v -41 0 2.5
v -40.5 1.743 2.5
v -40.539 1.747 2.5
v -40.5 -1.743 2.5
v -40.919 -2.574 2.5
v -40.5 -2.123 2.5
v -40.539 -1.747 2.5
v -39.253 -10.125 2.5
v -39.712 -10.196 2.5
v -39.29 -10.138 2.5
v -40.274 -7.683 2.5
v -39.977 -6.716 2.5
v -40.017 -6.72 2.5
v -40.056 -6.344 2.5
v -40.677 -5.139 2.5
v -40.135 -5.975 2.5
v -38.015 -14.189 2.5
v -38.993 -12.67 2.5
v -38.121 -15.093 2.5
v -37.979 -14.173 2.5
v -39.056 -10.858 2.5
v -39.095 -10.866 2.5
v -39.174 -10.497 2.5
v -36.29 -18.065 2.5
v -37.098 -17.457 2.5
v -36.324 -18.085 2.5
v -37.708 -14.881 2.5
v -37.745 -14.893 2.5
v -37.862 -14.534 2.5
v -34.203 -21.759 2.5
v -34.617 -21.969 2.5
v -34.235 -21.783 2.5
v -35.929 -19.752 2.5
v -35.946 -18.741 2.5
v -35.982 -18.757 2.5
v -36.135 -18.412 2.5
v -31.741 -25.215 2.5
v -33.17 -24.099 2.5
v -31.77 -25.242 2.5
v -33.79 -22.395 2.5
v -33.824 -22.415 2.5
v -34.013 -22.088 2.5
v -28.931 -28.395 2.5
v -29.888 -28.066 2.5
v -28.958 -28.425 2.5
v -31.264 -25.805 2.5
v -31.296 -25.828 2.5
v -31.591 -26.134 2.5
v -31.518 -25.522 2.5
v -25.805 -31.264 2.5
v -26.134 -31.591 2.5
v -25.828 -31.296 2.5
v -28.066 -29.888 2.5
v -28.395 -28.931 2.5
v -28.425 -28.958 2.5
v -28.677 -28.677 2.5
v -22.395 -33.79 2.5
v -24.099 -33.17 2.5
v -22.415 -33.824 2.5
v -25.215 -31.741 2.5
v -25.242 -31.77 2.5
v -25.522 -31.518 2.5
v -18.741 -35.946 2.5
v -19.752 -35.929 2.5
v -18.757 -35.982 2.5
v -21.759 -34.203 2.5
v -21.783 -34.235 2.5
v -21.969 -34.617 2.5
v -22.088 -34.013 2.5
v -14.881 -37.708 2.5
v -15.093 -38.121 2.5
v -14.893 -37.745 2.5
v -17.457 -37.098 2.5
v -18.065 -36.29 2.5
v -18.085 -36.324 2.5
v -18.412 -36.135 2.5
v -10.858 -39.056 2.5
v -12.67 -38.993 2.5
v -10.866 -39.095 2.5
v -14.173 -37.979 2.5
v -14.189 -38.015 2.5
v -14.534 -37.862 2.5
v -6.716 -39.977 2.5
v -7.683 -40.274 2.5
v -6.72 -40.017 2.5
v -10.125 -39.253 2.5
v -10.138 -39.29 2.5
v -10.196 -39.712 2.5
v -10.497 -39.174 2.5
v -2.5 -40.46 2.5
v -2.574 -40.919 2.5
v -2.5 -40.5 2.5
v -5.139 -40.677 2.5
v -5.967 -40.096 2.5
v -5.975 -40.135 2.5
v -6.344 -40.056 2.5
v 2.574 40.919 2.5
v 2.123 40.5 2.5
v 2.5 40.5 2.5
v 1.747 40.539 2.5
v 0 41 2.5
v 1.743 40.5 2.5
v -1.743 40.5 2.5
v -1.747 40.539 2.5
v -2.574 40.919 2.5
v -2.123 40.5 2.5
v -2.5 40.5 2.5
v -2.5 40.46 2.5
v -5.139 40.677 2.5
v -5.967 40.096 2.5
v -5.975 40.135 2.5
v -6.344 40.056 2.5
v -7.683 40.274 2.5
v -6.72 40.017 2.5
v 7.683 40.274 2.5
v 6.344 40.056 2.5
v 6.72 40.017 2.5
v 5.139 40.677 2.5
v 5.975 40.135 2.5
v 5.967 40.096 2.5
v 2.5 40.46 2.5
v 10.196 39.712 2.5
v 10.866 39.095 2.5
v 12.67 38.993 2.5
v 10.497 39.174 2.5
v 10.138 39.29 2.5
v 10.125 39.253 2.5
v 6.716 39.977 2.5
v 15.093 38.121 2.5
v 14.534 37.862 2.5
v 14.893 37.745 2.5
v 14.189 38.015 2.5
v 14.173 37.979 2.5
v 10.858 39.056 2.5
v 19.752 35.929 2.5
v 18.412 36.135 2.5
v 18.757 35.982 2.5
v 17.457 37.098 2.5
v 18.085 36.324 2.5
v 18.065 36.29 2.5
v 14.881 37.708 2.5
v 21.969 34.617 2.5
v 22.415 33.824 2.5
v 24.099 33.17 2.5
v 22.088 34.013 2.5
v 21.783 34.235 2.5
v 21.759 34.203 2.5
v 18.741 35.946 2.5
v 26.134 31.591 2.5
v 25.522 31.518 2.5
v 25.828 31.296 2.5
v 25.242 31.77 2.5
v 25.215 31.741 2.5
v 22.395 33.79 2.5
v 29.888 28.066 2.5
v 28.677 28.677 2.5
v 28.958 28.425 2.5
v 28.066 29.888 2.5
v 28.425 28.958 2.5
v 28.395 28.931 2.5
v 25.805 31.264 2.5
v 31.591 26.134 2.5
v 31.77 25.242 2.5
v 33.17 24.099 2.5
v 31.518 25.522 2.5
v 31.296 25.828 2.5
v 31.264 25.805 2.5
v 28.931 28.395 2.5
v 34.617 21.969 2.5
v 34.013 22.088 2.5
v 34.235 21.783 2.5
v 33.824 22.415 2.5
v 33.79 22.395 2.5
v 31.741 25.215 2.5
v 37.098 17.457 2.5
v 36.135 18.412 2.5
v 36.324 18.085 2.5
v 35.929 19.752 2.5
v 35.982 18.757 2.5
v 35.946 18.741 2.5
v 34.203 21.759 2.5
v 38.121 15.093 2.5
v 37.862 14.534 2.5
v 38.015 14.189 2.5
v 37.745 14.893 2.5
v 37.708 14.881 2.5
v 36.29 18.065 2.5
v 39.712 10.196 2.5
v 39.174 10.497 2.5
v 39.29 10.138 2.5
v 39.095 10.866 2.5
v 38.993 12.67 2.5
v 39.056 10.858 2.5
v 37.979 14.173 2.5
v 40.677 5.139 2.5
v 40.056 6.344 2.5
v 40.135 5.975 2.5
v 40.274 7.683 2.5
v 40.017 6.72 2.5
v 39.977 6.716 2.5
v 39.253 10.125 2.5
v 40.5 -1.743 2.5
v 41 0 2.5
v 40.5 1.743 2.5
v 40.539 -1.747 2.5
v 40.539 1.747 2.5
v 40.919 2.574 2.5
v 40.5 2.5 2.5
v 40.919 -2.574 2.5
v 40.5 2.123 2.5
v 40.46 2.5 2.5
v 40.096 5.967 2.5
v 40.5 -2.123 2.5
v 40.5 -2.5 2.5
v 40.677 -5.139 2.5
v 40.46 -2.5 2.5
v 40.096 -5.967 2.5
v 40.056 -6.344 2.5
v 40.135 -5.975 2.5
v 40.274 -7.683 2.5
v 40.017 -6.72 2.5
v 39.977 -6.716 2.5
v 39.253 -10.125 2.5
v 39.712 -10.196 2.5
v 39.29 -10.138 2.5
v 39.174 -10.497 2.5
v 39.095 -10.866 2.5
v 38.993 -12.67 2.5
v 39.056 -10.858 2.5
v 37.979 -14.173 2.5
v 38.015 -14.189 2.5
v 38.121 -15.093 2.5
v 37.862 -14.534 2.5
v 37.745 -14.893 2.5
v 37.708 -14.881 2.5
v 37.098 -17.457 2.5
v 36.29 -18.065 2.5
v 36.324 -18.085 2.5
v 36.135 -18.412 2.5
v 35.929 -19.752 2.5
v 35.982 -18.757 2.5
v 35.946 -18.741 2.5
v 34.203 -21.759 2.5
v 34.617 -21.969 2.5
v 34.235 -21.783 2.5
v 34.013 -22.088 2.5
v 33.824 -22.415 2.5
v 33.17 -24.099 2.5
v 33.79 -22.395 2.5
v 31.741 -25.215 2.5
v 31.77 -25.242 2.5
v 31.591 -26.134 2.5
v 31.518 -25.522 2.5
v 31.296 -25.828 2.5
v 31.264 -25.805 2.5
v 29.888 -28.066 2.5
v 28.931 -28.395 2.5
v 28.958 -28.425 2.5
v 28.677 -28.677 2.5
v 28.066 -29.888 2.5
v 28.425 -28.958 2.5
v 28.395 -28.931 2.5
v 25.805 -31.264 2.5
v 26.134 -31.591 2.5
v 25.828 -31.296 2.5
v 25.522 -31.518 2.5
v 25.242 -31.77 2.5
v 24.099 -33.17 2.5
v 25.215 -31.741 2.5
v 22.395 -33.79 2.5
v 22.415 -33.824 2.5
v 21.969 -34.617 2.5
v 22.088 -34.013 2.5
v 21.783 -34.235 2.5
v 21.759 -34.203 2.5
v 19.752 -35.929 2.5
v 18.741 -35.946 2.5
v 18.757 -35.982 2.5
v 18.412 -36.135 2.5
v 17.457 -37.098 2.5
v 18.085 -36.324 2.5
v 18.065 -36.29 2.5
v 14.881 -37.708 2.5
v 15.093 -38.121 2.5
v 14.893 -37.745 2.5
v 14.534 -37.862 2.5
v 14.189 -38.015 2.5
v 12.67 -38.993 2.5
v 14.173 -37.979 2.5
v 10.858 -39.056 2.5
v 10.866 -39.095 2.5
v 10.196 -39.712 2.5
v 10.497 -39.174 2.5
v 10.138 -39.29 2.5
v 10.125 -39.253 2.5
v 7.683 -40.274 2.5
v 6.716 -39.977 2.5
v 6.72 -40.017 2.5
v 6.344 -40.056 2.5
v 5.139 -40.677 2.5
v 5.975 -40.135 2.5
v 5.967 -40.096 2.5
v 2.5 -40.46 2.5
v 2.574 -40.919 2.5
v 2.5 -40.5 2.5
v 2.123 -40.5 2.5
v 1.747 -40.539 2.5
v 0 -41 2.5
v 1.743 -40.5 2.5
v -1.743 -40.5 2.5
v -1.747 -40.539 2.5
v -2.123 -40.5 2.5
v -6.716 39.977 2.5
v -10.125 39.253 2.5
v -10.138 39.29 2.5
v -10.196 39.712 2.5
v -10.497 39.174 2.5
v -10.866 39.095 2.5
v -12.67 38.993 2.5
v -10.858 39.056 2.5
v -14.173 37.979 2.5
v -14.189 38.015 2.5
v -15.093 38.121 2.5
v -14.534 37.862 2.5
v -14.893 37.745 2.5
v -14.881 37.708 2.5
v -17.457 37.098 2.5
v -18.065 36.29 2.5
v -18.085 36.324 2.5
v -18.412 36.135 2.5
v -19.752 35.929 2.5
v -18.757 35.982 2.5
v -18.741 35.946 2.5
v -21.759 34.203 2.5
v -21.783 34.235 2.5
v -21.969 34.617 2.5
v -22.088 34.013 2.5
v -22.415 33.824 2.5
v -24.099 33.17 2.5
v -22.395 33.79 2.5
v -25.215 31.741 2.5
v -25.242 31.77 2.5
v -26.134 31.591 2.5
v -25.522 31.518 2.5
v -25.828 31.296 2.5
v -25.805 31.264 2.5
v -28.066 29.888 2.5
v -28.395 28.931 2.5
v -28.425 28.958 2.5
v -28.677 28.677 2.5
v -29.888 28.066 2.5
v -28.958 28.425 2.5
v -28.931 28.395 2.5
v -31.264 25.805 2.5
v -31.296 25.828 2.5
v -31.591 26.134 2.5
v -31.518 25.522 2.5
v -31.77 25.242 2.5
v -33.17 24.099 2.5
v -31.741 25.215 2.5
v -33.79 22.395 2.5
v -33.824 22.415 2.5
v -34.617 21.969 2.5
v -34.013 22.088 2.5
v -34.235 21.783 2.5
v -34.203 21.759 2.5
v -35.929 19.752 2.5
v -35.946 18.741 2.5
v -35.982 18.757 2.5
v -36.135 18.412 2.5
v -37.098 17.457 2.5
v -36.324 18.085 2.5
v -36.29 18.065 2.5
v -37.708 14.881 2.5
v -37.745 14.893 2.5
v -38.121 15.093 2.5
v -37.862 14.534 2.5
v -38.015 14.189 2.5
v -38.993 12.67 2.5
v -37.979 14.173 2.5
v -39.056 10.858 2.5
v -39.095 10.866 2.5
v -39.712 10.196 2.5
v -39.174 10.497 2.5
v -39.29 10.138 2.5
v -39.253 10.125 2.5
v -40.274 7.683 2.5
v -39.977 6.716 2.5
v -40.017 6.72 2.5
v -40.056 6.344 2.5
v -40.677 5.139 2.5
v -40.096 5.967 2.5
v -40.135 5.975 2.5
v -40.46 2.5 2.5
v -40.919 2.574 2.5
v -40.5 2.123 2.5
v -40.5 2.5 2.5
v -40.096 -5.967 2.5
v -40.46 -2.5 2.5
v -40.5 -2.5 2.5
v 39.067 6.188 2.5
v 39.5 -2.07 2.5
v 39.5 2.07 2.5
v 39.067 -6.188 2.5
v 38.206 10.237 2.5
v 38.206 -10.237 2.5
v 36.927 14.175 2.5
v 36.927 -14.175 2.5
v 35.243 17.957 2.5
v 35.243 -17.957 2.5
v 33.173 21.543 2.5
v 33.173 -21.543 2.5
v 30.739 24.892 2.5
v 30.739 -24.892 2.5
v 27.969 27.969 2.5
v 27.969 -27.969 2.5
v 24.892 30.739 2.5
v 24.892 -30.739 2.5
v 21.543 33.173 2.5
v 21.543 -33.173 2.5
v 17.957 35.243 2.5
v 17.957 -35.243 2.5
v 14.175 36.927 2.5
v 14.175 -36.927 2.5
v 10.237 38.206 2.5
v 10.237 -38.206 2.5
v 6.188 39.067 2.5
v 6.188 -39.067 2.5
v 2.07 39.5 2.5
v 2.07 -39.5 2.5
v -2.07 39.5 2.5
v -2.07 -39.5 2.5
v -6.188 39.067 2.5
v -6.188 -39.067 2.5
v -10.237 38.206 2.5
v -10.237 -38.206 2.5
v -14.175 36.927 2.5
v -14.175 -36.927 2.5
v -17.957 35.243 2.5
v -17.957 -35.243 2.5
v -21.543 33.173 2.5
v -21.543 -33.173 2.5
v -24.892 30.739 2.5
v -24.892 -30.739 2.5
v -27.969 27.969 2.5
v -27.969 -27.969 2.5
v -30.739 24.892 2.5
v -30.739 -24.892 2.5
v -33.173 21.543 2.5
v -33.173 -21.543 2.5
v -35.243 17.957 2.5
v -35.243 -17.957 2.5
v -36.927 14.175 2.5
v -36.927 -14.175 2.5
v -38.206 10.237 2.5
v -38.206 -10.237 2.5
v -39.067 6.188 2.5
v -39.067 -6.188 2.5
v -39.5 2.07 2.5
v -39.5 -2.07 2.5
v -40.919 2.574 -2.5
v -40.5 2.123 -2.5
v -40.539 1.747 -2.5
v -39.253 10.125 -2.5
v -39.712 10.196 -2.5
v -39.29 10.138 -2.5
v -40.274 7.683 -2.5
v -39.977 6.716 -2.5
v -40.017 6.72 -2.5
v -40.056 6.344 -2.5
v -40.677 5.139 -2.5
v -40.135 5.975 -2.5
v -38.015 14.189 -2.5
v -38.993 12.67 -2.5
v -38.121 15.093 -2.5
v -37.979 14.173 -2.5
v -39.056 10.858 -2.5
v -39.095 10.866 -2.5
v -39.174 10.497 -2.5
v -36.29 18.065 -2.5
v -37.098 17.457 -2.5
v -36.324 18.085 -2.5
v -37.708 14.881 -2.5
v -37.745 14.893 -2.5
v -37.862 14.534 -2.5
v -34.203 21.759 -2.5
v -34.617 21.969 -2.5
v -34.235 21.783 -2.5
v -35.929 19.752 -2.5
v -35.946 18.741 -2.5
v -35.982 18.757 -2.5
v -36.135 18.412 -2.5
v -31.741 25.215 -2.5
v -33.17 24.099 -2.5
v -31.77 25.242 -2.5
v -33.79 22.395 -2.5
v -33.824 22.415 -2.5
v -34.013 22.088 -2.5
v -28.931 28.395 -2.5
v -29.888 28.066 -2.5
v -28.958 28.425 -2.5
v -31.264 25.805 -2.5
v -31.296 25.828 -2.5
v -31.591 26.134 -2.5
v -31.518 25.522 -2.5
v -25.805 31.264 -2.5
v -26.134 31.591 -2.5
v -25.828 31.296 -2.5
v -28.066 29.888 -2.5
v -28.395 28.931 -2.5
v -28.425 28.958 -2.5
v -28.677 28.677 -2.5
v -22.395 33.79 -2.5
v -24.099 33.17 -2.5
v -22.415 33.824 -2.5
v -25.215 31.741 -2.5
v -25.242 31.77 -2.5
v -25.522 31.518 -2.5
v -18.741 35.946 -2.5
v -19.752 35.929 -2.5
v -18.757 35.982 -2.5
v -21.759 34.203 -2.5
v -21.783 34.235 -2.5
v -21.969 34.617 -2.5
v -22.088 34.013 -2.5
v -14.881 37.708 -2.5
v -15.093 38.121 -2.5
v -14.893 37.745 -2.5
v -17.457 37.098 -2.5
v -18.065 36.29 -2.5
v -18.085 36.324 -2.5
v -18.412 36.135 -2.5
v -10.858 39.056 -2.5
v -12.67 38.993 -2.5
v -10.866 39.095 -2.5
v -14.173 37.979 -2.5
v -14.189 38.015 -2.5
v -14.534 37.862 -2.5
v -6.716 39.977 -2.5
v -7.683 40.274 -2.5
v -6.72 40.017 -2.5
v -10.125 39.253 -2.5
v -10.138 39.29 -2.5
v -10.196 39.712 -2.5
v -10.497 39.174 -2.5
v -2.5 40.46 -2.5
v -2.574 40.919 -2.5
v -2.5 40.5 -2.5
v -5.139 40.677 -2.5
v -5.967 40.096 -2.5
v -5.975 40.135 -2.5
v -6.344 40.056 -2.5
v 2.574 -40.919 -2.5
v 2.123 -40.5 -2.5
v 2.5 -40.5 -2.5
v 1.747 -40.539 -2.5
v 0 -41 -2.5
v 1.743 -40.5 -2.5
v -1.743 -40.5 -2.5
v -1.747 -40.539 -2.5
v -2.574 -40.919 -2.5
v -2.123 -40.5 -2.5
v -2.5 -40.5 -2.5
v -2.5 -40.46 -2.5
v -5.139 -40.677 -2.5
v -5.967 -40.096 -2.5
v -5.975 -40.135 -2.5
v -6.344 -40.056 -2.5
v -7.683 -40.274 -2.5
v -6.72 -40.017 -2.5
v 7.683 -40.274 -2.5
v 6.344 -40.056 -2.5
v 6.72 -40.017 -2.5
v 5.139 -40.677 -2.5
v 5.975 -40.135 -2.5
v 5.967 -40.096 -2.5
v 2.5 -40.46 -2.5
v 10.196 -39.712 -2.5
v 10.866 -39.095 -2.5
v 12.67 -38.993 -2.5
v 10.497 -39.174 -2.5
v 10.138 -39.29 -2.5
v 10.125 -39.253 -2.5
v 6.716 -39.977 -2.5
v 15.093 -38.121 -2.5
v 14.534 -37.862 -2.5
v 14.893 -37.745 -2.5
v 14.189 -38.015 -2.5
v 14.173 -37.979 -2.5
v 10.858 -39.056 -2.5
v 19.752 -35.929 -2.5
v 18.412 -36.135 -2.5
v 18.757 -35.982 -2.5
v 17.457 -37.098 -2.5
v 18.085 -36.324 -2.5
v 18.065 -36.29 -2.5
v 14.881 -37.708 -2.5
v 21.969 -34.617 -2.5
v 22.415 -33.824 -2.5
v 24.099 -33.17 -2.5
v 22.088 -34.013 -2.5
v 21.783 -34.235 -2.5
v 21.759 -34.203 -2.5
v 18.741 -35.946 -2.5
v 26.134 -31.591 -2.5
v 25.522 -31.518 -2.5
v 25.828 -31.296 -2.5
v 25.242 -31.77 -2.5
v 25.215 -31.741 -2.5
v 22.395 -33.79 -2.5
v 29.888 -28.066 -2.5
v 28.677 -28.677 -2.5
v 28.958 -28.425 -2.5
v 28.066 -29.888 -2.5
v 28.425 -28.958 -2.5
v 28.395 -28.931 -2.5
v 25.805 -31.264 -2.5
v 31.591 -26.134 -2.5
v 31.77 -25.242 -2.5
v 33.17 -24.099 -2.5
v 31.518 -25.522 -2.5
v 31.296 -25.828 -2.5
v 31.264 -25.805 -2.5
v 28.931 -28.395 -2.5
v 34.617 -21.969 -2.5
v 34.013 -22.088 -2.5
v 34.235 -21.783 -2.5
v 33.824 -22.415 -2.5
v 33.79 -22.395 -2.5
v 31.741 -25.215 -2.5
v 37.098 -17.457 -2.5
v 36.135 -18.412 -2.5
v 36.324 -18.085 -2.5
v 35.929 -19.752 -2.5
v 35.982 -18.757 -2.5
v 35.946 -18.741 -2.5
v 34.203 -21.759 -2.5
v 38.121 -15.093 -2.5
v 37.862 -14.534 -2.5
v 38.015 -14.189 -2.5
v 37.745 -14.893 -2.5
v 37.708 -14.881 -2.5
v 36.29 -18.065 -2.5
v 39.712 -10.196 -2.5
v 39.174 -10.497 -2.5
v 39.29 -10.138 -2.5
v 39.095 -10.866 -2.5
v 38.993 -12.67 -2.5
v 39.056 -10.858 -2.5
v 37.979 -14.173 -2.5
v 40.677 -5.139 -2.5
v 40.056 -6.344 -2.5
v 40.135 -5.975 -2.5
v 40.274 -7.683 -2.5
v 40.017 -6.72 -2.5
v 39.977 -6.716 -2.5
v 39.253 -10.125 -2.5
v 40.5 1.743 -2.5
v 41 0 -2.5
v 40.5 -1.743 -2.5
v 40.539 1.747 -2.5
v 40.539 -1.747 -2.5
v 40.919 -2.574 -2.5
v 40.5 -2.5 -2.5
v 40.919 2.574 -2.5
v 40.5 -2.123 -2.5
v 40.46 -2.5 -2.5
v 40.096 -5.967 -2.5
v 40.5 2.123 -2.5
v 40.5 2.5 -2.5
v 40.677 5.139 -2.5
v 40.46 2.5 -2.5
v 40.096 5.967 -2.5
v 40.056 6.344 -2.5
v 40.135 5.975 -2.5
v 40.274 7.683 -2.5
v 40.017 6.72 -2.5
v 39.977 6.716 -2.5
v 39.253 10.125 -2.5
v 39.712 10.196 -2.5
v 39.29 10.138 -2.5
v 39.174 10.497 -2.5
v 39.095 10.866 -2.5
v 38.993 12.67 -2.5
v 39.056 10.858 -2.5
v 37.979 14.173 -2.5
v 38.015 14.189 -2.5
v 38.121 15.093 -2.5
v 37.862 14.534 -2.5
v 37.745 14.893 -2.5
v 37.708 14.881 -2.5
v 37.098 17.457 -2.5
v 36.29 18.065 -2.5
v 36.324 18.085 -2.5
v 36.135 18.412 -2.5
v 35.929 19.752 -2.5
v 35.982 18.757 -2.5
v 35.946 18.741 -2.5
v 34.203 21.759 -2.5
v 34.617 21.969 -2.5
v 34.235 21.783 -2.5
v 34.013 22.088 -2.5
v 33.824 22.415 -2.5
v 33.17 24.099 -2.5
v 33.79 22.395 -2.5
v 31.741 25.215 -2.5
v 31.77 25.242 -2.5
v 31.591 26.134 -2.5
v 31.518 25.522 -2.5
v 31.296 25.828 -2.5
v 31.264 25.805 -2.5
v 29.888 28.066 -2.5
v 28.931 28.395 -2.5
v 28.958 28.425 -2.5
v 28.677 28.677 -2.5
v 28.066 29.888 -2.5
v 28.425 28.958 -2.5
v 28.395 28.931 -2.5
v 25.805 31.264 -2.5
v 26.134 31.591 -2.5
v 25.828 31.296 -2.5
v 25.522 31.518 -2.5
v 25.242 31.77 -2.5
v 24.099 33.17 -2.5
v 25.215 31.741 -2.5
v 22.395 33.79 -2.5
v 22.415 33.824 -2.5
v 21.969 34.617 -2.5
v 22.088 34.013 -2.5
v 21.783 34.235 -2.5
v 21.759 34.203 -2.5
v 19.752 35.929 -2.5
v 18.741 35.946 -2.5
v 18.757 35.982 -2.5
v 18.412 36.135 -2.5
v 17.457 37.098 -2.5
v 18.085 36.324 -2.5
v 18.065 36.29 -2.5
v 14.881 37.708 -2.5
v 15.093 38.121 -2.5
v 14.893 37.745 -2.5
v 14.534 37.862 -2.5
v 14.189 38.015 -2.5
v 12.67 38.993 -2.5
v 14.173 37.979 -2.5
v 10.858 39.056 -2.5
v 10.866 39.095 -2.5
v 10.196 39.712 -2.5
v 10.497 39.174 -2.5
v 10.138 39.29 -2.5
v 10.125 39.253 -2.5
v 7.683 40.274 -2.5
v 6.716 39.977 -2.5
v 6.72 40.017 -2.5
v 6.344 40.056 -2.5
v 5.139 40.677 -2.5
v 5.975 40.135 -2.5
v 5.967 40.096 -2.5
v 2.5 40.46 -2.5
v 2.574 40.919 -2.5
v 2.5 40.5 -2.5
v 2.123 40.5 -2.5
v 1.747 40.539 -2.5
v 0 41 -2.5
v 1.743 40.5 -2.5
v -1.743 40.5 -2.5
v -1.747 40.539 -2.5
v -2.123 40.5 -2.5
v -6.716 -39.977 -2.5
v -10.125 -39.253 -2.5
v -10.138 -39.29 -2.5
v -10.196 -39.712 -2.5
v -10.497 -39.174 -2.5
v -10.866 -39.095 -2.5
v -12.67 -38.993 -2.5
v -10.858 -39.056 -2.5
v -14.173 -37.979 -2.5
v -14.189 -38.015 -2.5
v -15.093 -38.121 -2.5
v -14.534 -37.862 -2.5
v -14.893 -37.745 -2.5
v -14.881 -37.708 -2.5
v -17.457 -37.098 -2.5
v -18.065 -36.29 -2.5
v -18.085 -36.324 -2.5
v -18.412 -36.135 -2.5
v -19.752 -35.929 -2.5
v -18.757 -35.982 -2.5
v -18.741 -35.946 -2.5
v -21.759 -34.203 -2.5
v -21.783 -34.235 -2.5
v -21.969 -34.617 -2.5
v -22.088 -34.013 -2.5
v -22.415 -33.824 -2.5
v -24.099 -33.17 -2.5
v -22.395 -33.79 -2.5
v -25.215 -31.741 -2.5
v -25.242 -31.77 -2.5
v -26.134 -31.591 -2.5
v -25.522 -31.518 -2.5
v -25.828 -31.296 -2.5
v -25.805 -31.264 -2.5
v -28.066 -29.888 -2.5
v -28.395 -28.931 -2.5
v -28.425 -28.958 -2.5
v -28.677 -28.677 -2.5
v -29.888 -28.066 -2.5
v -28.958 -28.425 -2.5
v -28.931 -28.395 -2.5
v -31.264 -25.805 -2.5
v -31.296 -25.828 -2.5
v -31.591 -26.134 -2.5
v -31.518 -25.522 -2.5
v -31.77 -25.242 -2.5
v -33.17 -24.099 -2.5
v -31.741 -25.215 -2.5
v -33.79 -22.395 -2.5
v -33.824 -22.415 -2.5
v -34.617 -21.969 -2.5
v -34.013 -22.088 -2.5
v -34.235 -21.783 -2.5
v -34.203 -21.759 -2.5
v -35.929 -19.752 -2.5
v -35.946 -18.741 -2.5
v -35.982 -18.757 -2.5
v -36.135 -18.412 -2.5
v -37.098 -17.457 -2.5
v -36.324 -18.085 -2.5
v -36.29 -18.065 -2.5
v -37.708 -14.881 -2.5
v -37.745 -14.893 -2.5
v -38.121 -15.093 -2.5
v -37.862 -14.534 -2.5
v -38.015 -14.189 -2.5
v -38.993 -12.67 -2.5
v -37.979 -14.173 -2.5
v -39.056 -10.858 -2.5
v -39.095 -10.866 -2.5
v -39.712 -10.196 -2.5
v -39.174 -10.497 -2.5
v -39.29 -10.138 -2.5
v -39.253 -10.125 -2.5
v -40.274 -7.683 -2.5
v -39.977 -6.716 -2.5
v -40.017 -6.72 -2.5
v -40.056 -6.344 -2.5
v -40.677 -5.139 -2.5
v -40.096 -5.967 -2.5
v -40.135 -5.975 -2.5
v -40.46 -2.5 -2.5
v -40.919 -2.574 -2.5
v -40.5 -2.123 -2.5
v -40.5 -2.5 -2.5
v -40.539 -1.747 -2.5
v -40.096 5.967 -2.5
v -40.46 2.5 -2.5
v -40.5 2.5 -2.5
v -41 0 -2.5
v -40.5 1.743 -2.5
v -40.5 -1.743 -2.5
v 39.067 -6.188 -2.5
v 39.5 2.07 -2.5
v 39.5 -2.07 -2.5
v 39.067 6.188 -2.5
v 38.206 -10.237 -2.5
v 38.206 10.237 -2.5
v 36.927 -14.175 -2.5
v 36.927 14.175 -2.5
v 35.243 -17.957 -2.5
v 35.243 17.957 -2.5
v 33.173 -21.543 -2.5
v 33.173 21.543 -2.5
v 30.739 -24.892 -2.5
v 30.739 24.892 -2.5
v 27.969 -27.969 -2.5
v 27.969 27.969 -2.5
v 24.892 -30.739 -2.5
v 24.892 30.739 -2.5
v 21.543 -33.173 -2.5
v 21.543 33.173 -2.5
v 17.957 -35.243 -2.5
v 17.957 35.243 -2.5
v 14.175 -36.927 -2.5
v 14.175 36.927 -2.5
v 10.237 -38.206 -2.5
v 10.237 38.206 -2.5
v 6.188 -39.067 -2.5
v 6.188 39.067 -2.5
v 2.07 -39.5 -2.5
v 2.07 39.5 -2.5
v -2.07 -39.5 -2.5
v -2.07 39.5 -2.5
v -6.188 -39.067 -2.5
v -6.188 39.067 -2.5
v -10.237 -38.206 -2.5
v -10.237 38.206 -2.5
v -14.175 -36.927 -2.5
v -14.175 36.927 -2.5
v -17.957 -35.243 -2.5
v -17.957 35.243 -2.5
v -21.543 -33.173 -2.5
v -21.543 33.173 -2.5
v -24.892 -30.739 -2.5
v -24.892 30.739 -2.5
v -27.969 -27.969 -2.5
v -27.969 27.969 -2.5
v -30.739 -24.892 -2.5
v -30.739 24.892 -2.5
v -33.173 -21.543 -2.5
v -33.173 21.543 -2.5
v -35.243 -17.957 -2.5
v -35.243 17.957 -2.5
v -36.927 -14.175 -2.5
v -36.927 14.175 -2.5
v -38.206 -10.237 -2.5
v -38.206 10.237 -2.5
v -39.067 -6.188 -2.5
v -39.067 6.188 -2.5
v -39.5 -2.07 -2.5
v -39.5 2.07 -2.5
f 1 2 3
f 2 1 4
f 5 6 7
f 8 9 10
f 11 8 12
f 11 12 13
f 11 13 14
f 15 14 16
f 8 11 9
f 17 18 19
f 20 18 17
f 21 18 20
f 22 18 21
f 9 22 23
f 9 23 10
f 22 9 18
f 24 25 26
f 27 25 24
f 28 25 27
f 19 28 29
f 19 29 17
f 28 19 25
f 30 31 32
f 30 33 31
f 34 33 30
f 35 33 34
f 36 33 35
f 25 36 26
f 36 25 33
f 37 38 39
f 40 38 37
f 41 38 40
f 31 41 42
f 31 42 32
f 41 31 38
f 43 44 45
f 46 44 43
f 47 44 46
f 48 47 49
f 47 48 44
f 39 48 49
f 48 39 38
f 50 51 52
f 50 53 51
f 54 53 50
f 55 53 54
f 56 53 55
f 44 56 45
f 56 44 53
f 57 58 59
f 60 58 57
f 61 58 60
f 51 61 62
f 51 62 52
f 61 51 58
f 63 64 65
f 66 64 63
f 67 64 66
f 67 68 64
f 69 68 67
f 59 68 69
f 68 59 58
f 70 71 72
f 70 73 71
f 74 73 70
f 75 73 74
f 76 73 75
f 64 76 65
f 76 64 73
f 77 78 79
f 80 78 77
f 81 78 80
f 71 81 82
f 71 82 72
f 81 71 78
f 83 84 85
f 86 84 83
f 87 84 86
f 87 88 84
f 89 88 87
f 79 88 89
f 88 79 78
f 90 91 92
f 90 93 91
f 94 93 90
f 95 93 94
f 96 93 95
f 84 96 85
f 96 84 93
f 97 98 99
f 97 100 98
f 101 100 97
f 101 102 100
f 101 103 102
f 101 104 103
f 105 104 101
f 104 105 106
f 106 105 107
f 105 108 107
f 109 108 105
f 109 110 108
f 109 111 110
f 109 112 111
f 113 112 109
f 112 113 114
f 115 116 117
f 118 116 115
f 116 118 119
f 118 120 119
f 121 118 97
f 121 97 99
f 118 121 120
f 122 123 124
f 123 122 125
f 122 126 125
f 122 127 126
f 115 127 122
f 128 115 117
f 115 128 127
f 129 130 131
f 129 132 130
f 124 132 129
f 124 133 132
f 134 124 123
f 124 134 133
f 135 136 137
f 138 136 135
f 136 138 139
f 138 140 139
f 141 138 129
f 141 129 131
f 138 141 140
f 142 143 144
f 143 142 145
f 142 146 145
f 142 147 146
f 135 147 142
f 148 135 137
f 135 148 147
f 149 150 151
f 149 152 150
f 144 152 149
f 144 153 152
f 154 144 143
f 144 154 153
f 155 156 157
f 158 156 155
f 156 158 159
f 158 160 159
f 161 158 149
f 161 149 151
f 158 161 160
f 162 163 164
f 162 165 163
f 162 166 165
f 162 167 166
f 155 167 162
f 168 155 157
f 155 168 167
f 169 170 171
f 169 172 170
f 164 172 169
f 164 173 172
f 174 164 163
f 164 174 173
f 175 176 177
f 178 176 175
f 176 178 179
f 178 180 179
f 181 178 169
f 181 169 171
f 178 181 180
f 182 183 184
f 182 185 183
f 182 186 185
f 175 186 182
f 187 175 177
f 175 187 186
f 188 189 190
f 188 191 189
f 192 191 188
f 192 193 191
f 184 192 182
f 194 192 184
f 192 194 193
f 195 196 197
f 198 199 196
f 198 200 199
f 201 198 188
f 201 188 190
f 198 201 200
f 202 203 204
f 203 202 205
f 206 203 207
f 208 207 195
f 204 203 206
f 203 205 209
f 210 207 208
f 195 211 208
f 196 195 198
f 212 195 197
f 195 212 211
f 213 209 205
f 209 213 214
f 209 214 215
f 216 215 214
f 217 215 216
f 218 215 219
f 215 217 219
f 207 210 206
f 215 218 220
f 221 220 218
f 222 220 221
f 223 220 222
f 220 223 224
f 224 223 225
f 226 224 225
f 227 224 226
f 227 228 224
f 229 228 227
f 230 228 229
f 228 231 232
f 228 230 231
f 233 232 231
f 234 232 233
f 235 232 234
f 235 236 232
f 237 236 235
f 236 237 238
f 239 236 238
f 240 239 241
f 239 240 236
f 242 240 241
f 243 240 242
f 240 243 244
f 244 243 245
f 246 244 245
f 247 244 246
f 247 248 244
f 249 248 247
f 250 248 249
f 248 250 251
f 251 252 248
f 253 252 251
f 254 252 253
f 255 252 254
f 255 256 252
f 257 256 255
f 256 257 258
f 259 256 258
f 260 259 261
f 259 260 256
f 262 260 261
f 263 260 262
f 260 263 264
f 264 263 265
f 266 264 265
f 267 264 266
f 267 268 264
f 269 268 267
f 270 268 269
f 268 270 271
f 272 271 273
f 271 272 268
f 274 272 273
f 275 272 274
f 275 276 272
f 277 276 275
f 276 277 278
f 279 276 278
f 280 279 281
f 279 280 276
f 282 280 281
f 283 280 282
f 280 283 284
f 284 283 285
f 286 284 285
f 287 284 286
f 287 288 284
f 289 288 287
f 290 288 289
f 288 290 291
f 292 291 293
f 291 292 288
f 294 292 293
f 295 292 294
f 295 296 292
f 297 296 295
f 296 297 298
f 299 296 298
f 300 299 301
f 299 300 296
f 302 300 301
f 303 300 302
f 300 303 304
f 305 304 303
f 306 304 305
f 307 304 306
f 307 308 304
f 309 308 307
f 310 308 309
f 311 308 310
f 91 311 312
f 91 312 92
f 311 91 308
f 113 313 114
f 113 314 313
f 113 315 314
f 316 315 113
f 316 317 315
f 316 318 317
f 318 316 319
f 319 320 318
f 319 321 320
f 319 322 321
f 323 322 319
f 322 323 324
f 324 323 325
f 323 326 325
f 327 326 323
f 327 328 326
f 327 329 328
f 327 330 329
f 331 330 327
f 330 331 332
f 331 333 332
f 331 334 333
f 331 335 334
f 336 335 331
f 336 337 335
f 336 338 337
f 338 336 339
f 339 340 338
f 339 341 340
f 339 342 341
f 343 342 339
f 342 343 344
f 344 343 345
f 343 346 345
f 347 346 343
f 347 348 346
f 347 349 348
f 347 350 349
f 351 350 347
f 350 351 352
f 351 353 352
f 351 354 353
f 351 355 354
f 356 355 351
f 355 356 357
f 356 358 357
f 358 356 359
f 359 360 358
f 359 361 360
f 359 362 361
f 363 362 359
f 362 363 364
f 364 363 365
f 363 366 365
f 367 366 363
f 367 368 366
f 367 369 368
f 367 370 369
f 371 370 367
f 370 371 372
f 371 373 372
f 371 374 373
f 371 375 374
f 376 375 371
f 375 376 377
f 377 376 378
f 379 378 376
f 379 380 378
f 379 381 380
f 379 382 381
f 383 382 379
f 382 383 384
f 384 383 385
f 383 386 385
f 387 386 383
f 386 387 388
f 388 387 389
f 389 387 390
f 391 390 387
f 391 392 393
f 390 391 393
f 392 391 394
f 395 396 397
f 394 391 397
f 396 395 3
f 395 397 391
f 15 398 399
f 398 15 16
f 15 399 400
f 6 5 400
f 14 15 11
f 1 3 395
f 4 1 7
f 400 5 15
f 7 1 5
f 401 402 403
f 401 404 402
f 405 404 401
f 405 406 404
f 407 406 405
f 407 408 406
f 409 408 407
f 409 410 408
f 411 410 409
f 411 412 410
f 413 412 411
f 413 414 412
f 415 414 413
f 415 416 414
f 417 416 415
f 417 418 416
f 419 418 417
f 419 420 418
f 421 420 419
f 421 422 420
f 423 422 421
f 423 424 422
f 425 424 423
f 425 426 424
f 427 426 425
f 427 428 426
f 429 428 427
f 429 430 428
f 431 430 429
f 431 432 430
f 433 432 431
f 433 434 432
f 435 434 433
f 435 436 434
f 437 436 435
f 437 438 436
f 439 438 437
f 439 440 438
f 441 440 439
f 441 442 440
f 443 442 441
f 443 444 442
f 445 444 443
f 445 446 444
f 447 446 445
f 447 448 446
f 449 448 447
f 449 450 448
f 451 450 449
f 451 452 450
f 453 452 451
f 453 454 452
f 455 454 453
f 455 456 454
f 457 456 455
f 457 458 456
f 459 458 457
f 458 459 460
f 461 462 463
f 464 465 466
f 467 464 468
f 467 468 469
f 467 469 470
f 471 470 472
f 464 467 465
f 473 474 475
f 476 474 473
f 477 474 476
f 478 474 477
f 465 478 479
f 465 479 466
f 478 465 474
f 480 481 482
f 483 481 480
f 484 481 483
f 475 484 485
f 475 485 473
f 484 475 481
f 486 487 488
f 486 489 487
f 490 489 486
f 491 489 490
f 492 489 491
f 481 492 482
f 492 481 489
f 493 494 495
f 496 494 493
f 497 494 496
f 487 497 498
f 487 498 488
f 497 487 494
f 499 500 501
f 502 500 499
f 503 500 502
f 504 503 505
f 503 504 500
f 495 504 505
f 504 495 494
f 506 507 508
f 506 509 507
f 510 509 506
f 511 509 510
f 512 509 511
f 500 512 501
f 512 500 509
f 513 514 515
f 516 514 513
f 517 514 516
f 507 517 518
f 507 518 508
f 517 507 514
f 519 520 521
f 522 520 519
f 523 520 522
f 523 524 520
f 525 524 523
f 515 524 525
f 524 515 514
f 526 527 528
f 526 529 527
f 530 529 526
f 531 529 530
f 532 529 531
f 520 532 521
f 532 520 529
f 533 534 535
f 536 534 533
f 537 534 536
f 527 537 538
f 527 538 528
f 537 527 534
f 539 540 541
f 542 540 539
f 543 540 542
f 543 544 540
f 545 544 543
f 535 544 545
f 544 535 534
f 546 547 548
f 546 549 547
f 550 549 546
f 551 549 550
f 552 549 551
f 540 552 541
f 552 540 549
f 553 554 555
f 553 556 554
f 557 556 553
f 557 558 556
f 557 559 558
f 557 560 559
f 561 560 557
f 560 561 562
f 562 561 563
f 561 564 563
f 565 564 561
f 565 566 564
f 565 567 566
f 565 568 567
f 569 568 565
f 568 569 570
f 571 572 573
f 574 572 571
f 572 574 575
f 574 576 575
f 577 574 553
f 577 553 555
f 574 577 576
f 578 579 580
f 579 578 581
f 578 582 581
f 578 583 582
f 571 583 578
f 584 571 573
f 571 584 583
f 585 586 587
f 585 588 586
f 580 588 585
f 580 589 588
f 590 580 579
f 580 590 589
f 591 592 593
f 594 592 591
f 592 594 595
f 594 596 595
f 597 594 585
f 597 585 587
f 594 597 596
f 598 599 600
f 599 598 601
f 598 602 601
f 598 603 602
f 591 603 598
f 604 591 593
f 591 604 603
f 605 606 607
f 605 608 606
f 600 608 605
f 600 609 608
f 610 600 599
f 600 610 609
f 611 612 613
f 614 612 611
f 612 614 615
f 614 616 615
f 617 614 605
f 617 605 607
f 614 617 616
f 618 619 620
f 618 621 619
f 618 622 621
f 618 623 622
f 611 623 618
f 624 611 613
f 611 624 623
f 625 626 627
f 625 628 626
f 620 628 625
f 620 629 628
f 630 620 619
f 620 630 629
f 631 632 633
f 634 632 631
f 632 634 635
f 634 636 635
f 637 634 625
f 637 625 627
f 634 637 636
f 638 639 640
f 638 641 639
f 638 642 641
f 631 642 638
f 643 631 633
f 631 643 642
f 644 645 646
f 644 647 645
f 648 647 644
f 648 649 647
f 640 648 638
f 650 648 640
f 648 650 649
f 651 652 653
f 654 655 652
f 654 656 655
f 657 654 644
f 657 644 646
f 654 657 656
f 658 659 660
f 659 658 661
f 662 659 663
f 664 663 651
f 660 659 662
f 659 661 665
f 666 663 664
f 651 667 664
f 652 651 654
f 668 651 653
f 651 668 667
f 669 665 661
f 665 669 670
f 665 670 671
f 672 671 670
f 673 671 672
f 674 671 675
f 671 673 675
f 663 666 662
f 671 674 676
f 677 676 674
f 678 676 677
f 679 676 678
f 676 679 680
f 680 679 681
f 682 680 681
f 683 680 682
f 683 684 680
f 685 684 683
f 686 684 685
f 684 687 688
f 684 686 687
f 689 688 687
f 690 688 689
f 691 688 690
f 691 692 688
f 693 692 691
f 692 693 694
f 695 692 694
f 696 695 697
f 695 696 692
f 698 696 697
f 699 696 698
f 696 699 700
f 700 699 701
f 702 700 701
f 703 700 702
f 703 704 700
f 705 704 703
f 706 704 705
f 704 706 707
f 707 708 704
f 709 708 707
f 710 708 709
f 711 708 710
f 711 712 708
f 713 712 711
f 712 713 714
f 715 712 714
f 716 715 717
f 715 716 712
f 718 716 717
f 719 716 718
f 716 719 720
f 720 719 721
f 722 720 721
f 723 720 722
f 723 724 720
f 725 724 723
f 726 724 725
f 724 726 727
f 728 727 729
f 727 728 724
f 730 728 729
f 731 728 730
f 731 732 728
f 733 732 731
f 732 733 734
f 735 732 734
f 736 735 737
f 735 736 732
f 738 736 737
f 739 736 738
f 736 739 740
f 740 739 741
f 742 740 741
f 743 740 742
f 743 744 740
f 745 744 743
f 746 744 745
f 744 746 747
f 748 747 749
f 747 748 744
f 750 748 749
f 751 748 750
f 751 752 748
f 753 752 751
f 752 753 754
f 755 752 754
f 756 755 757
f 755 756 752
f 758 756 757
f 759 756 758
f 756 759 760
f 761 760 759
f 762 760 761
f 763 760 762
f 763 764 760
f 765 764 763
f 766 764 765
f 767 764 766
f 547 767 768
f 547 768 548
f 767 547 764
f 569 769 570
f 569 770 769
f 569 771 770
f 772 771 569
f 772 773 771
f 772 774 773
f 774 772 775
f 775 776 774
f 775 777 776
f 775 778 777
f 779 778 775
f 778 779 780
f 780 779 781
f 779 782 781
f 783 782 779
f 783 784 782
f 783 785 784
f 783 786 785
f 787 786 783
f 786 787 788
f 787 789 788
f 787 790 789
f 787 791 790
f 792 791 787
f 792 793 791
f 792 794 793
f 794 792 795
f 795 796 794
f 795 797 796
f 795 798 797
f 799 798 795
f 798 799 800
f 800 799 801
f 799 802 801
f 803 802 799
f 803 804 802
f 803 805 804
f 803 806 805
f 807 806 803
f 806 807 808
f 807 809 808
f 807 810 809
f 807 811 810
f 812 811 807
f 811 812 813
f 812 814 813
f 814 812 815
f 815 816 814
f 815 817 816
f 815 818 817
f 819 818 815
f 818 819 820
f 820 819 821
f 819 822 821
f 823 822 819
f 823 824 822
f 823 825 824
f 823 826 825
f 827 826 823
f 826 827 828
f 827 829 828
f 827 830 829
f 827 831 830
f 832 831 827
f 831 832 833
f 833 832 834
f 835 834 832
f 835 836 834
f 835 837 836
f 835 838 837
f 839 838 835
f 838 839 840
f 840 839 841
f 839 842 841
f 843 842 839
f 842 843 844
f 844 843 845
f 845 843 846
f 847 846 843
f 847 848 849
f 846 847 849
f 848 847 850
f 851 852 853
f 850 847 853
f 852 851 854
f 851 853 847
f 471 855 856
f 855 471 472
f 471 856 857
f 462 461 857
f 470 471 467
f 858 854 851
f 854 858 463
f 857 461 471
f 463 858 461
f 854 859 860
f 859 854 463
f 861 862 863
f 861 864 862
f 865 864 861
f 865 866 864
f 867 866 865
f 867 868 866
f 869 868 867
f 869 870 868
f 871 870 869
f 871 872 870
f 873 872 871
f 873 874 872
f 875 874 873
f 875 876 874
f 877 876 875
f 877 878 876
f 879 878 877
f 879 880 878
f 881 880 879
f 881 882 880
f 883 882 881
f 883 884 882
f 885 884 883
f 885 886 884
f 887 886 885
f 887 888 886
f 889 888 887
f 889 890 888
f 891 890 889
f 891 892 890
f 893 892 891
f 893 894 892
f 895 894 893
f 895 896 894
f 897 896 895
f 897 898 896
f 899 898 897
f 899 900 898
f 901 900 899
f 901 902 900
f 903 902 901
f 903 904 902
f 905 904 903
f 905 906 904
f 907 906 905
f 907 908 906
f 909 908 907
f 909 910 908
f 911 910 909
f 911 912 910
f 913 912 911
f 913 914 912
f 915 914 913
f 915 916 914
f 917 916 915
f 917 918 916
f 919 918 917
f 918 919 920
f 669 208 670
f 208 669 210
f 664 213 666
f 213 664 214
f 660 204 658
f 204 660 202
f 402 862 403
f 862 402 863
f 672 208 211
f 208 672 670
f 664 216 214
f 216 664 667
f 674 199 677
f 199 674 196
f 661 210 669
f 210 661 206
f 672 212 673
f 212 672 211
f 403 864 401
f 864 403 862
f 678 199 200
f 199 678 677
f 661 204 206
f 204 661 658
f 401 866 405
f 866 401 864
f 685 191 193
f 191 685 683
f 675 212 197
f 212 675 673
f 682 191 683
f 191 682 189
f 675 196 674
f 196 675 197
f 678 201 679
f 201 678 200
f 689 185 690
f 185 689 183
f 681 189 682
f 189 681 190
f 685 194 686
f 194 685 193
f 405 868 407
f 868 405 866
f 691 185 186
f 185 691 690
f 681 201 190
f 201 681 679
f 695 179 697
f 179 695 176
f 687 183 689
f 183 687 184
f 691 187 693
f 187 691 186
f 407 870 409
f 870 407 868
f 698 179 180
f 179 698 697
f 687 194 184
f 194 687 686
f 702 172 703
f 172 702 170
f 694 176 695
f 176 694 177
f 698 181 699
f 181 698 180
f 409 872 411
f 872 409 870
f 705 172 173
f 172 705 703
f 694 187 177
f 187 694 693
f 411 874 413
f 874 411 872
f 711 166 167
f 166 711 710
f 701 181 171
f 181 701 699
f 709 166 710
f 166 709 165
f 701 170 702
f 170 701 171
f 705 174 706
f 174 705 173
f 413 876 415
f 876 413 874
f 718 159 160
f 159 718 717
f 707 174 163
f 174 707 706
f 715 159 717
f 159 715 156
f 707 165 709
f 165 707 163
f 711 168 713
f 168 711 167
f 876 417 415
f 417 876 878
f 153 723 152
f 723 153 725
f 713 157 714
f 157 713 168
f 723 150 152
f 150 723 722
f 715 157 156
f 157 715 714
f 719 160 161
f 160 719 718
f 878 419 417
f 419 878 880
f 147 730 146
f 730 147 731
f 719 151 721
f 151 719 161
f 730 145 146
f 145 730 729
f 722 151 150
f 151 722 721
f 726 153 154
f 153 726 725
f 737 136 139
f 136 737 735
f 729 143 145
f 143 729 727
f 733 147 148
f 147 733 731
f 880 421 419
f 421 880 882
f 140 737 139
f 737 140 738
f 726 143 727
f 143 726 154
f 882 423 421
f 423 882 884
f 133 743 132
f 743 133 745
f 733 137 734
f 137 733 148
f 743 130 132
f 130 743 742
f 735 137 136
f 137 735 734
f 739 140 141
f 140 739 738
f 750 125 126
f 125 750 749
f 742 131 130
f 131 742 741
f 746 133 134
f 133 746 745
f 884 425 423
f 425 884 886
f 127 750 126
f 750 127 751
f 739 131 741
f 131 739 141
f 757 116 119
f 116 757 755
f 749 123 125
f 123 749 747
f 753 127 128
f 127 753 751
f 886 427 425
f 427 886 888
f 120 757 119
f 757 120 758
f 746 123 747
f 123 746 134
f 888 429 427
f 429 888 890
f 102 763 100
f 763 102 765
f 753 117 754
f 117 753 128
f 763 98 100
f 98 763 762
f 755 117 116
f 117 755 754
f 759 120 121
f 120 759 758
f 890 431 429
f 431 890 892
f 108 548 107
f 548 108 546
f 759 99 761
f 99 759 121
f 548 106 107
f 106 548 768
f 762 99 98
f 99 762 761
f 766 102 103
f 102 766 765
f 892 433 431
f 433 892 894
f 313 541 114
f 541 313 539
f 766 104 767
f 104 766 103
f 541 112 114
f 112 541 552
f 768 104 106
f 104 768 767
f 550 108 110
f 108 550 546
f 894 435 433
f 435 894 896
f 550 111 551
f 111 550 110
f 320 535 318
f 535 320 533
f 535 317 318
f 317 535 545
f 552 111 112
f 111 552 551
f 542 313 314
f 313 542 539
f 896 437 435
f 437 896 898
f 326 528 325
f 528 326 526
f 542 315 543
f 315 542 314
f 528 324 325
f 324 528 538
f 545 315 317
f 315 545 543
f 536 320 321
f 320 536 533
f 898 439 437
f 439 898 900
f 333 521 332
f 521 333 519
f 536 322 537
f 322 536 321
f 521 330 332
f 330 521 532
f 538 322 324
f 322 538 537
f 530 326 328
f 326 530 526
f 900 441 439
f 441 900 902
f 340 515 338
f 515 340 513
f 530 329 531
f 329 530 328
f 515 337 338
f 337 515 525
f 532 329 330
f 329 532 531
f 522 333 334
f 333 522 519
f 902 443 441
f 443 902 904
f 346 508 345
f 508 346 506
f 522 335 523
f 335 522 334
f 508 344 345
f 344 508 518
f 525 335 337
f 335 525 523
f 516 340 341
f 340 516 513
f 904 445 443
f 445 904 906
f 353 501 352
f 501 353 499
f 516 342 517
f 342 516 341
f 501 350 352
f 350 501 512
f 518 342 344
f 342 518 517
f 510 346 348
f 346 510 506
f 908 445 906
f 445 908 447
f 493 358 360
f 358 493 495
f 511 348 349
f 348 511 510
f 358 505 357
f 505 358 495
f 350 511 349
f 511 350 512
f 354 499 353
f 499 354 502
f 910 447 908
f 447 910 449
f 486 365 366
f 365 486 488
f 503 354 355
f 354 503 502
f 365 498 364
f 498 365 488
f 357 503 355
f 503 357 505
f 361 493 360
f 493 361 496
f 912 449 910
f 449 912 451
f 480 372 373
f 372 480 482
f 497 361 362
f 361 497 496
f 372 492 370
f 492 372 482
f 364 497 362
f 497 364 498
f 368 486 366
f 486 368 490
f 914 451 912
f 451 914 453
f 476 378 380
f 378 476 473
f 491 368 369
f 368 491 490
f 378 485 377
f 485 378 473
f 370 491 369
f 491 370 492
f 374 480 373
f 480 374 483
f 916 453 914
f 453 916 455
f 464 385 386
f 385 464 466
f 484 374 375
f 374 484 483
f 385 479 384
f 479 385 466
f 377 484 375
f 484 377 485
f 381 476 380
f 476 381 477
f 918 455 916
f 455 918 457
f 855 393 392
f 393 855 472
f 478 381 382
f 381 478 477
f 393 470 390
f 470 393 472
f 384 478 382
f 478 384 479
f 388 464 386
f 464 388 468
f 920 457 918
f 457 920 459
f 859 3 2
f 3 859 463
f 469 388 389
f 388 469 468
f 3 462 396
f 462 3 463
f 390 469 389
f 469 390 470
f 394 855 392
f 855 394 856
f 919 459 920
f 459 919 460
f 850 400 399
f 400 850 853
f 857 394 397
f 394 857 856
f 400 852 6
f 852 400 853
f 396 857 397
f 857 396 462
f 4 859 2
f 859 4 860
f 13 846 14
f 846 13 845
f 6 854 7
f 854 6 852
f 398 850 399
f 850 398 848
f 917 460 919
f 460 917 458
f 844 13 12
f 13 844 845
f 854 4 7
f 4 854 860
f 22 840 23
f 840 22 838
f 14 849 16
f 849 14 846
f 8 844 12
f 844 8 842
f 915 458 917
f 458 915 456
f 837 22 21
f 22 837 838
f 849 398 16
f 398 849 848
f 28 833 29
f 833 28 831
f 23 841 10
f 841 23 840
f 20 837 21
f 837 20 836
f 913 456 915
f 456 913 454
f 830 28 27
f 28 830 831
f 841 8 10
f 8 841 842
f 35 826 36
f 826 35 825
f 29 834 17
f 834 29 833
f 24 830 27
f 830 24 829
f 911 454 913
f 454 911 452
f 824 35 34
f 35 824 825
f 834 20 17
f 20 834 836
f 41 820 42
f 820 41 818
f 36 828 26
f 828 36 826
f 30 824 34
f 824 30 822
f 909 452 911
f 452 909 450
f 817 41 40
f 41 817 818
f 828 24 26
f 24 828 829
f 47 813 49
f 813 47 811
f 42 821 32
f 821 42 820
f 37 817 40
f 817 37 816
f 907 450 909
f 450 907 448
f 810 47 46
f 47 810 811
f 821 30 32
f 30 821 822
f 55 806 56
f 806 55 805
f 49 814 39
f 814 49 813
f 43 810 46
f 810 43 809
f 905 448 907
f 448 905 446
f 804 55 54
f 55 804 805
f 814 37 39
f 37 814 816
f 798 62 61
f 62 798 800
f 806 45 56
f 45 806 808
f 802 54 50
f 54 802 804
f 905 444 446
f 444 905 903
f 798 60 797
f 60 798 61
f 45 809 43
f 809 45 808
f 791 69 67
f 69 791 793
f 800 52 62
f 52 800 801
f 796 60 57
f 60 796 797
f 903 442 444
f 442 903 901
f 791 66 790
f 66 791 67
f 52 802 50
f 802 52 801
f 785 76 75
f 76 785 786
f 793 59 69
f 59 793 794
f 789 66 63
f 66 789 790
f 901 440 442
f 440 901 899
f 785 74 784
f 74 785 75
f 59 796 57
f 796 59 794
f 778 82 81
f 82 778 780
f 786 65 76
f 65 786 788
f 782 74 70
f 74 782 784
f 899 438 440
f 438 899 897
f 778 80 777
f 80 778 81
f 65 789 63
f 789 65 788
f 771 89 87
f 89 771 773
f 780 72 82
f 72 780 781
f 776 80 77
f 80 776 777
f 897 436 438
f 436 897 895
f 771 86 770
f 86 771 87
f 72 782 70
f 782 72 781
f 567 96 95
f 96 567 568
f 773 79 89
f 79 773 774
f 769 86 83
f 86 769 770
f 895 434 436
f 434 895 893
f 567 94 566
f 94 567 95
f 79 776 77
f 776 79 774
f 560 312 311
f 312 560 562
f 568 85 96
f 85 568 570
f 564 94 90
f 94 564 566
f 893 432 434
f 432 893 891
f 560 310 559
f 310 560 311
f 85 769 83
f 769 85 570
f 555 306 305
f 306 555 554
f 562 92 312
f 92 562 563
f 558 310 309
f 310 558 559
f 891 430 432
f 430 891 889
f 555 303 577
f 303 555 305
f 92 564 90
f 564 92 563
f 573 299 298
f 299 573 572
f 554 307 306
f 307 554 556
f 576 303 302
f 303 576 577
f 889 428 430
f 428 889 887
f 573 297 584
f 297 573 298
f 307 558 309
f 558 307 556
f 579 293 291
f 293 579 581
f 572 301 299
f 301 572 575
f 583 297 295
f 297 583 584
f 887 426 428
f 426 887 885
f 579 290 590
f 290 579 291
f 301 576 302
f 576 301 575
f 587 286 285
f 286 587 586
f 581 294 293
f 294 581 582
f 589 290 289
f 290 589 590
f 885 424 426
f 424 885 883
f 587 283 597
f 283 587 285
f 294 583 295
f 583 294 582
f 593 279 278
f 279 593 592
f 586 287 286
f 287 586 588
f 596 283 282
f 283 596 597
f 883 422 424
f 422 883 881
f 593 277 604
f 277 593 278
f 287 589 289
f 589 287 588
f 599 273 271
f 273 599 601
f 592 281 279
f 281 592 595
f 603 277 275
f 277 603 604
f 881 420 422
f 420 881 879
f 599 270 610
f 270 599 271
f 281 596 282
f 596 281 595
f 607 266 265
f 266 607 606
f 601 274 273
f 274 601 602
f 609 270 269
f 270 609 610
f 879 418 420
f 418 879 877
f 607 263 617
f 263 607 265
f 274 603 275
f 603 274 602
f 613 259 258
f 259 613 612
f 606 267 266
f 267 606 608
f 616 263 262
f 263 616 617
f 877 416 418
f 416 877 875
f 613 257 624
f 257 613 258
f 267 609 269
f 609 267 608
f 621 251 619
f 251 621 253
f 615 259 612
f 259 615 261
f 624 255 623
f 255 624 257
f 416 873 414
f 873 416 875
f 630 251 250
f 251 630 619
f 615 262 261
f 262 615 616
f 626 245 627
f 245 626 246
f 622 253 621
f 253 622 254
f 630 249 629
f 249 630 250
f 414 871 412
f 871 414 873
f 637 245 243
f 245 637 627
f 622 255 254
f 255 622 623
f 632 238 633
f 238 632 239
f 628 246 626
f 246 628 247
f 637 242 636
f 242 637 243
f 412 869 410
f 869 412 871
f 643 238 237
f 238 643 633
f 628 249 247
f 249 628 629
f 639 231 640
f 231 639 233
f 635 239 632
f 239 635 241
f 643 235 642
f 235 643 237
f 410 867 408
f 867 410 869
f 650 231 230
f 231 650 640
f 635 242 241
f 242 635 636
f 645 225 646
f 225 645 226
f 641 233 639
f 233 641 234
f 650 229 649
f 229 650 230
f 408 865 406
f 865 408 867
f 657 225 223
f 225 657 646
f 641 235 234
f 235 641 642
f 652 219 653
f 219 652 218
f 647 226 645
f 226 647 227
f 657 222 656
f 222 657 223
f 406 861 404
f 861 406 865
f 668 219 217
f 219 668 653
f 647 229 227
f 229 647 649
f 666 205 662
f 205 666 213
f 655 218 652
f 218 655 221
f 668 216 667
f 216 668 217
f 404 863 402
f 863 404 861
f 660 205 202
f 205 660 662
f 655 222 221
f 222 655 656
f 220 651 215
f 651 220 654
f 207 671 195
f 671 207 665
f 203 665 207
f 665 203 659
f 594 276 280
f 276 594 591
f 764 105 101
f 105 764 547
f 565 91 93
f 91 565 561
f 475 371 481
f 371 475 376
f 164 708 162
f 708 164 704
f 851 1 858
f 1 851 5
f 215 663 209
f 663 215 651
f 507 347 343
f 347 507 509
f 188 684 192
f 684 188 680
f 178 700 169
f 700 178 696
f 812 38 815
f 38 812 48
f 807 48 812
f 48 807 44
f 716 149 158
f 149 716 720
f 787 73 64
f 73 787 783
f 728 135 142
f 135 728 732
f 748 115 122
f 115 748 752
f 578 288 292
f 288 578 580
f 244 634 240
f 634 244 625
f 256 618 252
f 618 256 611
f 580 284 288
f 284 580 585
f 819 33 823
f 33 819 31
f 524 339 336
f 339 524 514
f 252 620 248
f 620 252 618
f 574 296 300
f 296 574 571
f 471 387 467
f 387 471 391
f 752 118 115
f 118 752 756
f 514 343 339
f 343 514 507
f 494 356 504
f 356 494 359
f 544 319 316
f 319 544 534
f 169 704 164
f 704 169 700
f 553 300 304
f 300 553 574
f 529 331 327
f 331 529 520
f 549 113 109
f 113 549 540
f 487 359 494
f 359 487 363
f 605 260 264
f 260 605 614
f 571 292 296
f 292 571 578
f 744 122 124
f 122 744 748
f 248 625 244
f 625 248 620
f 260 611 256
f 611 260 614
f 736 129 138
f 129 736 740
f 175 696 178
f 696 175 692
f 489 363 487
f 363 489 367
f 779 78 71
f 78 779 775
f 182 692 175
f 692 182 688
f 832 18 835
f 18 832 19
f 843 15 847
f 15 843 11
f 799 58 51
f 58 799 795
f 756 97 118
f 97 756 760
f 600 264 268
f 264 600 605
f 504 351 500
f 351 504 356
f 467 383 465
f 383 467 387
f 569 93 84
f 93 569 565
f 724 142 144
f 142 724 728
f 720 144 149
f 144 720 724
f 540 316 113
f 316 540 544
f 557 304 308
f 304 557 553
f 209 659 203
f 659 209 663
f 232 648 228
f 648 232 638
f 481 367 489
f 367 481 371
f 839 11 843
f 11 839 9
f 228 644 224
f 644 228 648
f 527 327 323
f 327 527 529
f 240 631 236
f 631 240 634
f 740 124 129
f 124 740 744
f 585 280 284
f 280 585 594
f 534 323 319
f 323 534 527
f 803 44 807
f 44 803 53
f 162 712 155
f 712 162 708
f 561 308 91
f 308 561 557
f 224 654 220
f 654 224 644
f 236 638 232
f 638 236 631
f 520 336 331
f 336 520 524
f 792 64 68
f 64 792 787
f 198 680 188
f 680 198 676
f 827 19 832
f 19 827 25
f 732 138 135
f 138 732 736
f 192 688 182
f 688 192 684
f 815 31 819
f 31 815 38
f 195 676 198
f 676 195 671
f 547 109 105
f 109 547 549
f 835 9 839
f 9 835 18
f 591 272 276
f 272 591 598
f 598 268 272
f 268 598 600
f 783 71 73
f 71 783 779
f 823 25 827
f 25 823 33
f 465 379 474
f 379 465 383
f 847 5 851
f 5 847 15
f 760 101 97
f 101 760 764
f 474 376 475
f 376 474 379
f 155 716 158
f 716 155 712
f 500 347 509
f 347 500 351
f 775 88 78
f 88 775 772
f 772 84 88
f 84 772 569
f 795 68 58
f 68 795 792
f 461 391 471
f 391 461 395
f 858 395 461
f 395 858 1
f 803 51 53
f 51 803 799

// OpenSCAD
// Auto-generated Code Vault for 'PlanetaryGear' [Openscad]

module PlanetaryGear(
  sunTeeth = 10,
  planetTeeth = 20,
  ringTeeth = 60,
  pitchRadius = 20,
  thickness = 5,
  $fn = 100
) {
  // Calculate the pitch diameter
  sunPitchDiameter = pitchRadius * 2 * sunTeeth / (sunTeeth + planetTeeth);
  planetPitchDiameter = pitchRadius * 2 * planetTeeth / (sunTeeth + planetTeeth);
  ringPitchDiameter = pitchRadius * 2 * ringTeeth / (sunTeeth + planetTeeth);

  // Calculate the outer diameter
  sunOuterDiameter = sunPitchDiameter + 2;
  planetOuterDiameter = planetPitchDiameter + 2;
  ringOuterDiameter = ringPitchDiameter + 2;

  // Central sun gear
  module sunGear() {
    cylinder(h = thickness, d = sunOuterDiameter, center = true, $fn = $fn);
    for (i = [0 : sunTeeth - 1]) {
      rotate([0, 0, i * 360 / sunTeeth])
      translate([sunPitchDiameter / 2, 0, 0])
      cube([1, thickness, thickness], center = true);
    }
  }

  // Planet gear
  module planetGear() {
    cylinder(h = thickness, d = planetOuterDiameter, center = true, $fn = $fn);
    for (i = [0 : planetTeeth - 1]) {
      rotate([0, 0, i * 360 / planetTeeth])
      translate([planetPitchDiameter / 2, 0, 0])
      cube([1, thickness, thickness], center = true);
    }
  }

  // Outer ring gear
  module ringGear() {
    difference() {
      cylinder(h = thickness, d = ringOuterDiameter, center = true, $fn = $fn);
      for (i = [0 : ringTeeth - 1]) {
        rotate([0, 0, i * 360 / ringTeeth])
        translate([ringPitchDiameter / 2, 0, 0])
        cube([1, thickness, thickness], center = true);
      }
    }
  }

  // Assemble the planetary gear system
  sunGear();
  for (i = [0 : 2]) {
    rotate([0, 0, i * 120])
    translate([pitchRadius, 0, 0])
    planetGear();
  }
  ringGear();
}

// Example usage:
PlanetaryGear(sunTeeth = 10, planetTeeth = 20, ringTeeth = 60, pitchRadius = 20, thickness = 5);
